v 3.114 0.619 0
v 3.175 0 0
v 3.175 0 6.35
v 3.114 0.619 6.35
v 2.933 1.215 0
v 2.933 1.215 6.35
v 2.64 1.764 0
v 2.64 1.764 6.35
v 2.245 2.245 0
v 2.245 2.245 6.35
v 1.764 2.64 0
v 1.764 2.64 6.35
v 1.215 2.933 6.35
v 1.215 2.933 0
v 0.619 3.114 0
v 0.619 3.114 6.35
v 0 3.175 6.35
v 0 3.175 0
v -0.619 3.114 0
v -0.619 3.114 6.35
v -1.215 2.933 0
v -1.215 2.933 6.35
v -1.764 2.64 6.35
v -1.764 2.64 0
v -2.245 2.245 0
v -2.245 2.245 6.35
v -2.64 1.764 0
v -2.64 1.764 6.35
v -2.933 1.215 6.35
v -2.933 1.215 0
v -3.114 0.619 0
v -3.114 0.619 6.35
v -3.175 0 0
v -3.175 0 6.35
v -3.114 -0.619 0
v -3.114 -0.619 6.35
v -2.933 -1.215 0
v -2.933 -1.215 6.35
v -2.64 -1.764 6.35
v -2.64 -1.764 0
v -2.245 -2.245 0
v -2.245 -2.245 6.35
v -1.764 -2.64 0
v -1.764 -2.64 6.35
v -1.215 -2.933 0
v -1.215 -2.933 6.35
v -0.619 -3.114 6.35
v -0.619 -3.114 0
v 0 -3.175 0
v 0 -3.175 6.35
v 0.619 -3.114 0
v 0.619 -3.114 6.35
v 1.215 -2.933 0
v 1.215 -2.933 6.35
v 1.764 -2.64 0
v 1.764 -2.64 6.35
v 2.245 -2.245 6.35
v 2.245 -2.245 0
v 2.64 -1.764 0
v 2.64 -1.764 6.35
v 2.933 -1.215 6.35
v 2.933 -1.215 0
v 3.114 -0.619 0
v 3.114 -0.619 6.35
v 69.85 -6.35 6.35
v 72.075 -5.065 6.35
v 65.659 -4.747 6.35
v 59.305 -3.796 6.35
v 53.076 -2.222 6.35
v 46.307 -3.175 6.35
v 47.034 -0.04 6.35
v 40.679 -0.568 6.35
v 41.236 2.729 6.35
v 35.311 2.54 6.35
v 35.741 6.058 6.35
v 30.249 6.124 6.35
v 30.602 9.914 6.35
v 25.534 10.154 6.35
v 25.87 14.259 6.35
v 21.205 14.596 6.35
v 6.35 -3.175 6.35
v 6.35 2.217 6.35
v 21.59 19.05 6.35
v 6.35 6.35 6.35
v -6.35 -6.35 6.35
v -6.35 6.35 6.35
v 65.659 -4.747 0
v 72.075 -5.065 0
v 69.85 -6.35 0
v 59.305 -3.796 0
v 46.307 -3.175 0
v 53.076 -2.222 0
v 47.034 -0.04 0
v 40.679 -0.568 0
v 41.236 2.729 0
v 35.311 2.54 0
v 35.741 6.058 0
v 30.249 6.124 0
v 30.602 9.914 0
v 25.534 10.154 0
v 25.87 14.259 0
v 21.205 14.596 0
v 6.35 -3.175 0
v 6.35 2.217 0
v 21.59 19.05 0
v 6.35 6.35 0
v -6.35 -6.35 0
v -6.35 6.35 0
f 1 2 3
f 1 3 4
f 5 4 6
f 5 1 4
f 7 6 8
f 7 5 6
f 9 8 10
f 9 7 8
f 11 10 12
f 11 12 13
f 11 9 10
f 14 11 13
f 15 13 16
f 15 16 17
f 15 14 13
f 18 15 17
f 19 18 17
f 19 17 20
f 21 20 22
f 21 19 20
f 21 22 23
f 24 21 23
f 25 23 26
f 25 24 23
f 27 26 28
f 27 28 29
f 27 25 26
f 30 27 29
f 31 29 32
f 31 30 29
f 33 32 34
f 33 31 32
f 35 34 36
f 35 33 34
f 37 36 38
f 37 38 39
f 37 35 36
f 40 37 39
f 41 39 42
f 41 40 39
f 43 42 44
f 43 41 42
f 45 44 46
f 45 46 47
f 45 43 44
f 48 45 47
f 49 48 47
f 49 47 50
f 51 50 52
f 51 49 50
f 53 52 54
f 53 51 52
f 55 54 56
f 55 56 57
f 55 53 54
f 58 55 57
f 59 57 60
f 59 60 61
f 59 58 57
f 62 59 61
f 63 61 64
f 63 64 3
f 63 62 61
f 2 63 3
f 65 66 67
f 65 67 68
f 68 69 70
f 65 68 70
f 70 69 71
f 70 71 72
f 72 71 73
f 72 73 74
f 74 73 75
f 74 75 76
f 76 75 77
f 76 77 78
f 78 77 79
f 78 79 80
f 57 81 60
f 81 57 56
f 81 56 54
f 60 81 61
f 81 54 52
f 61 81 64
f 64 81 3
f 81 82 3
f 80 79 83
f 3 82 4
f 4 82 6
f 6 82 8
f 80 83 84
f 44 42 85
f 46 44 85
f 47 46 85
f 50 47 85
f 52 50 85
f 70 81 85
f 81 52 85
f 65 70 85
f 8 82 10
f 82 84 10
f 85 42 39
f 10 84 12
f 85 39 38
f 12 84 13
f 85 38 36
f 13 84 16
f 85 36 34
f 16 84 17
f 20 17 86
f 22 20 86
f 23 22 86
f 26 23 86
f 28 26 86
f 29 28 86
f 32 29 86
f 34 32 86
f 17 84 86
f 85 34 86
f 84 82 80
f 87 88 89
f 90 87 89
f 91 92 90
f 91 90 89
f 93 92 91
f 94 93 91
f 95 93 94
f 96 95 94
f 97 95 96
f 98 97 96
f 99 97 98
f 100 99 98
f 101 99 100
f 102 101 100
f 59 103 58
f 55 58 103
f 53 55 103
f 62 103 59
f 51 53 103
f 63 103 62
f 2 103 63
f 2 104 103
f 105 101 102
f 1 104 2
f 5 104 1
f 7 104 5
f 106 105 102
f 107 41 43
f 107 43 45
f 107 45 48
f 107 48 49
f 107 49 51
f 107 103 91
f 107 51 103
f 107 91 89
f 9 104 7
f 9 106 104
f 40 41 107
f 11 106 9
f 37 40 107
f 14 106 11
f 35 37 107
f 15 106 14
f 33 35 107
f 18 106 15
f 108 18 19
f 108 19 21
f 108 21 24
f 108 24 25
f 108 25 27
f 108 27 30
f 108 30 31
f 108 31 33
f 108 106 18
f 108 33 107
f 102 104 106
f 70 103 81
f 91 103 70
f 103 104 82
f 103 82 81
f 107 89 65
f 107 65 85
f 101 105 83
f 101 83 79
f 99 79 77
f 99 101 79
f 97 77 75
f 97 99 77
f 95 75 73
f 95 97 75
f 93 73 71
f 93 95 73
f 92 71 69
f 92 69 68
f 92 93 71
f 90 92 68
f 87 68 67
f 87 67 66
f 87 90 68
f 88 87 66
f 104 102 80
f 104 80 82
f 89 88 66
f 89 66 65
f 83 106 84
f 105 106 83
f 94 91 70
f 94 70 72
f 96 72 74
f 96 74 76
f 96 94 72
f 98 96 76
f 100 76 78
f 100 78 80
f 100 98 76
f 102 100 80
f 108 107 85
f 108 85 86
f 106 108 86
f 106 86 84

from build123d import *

# Parameters (mm, degrees)
SKETCH1_R           = 3.175
BOSS_EXTRUDE1_DEPTH = 6.35


with BuildPart() as part:
    # Sketch1 → Boss-Extrude1 (new body)
    with BuildSketch(Plane.XY):
        with BuildLine():
            Line((6.35, 6.35), (21.59, 19.05))
            ThreePointArc((21.59, 19.05), (44.100663682, 1.273044039), (72.075222755, -5.065267043))
            Line((72.075222755, -5.065267043), (69.85, -6.35))
            Line((69.85, -6.35), (6.35, -6.35))
            Line((6.35, -6.35), (-6.35, -6.35))
            Line((-6.35, -6.35), (-6.35, 6.35))
            Line((-6.35, 6.35), (6.35, 6.35))
        make_face()
        Circle(SKETCH1_R, mode=Mode.SUBTRACT)
        with BuildLine():
            Line((6.35, -3.175), (46.306849943, -3.175))
            ThreePointArc((46.306849943, -3.175), (32.739109843, 4.274408806), (21.204775898, 14.596056128))
            Line((21.204775898, 14.596056128), (6.35, 2.217076213))
            Line((6.35, 2.217076213), (6.35, -3.175))
        make_face(mode=Mode.SUBTRACT)
    extrude(amount=BOSS_EXTRUDE1_DEPTH)


solid = part.part
